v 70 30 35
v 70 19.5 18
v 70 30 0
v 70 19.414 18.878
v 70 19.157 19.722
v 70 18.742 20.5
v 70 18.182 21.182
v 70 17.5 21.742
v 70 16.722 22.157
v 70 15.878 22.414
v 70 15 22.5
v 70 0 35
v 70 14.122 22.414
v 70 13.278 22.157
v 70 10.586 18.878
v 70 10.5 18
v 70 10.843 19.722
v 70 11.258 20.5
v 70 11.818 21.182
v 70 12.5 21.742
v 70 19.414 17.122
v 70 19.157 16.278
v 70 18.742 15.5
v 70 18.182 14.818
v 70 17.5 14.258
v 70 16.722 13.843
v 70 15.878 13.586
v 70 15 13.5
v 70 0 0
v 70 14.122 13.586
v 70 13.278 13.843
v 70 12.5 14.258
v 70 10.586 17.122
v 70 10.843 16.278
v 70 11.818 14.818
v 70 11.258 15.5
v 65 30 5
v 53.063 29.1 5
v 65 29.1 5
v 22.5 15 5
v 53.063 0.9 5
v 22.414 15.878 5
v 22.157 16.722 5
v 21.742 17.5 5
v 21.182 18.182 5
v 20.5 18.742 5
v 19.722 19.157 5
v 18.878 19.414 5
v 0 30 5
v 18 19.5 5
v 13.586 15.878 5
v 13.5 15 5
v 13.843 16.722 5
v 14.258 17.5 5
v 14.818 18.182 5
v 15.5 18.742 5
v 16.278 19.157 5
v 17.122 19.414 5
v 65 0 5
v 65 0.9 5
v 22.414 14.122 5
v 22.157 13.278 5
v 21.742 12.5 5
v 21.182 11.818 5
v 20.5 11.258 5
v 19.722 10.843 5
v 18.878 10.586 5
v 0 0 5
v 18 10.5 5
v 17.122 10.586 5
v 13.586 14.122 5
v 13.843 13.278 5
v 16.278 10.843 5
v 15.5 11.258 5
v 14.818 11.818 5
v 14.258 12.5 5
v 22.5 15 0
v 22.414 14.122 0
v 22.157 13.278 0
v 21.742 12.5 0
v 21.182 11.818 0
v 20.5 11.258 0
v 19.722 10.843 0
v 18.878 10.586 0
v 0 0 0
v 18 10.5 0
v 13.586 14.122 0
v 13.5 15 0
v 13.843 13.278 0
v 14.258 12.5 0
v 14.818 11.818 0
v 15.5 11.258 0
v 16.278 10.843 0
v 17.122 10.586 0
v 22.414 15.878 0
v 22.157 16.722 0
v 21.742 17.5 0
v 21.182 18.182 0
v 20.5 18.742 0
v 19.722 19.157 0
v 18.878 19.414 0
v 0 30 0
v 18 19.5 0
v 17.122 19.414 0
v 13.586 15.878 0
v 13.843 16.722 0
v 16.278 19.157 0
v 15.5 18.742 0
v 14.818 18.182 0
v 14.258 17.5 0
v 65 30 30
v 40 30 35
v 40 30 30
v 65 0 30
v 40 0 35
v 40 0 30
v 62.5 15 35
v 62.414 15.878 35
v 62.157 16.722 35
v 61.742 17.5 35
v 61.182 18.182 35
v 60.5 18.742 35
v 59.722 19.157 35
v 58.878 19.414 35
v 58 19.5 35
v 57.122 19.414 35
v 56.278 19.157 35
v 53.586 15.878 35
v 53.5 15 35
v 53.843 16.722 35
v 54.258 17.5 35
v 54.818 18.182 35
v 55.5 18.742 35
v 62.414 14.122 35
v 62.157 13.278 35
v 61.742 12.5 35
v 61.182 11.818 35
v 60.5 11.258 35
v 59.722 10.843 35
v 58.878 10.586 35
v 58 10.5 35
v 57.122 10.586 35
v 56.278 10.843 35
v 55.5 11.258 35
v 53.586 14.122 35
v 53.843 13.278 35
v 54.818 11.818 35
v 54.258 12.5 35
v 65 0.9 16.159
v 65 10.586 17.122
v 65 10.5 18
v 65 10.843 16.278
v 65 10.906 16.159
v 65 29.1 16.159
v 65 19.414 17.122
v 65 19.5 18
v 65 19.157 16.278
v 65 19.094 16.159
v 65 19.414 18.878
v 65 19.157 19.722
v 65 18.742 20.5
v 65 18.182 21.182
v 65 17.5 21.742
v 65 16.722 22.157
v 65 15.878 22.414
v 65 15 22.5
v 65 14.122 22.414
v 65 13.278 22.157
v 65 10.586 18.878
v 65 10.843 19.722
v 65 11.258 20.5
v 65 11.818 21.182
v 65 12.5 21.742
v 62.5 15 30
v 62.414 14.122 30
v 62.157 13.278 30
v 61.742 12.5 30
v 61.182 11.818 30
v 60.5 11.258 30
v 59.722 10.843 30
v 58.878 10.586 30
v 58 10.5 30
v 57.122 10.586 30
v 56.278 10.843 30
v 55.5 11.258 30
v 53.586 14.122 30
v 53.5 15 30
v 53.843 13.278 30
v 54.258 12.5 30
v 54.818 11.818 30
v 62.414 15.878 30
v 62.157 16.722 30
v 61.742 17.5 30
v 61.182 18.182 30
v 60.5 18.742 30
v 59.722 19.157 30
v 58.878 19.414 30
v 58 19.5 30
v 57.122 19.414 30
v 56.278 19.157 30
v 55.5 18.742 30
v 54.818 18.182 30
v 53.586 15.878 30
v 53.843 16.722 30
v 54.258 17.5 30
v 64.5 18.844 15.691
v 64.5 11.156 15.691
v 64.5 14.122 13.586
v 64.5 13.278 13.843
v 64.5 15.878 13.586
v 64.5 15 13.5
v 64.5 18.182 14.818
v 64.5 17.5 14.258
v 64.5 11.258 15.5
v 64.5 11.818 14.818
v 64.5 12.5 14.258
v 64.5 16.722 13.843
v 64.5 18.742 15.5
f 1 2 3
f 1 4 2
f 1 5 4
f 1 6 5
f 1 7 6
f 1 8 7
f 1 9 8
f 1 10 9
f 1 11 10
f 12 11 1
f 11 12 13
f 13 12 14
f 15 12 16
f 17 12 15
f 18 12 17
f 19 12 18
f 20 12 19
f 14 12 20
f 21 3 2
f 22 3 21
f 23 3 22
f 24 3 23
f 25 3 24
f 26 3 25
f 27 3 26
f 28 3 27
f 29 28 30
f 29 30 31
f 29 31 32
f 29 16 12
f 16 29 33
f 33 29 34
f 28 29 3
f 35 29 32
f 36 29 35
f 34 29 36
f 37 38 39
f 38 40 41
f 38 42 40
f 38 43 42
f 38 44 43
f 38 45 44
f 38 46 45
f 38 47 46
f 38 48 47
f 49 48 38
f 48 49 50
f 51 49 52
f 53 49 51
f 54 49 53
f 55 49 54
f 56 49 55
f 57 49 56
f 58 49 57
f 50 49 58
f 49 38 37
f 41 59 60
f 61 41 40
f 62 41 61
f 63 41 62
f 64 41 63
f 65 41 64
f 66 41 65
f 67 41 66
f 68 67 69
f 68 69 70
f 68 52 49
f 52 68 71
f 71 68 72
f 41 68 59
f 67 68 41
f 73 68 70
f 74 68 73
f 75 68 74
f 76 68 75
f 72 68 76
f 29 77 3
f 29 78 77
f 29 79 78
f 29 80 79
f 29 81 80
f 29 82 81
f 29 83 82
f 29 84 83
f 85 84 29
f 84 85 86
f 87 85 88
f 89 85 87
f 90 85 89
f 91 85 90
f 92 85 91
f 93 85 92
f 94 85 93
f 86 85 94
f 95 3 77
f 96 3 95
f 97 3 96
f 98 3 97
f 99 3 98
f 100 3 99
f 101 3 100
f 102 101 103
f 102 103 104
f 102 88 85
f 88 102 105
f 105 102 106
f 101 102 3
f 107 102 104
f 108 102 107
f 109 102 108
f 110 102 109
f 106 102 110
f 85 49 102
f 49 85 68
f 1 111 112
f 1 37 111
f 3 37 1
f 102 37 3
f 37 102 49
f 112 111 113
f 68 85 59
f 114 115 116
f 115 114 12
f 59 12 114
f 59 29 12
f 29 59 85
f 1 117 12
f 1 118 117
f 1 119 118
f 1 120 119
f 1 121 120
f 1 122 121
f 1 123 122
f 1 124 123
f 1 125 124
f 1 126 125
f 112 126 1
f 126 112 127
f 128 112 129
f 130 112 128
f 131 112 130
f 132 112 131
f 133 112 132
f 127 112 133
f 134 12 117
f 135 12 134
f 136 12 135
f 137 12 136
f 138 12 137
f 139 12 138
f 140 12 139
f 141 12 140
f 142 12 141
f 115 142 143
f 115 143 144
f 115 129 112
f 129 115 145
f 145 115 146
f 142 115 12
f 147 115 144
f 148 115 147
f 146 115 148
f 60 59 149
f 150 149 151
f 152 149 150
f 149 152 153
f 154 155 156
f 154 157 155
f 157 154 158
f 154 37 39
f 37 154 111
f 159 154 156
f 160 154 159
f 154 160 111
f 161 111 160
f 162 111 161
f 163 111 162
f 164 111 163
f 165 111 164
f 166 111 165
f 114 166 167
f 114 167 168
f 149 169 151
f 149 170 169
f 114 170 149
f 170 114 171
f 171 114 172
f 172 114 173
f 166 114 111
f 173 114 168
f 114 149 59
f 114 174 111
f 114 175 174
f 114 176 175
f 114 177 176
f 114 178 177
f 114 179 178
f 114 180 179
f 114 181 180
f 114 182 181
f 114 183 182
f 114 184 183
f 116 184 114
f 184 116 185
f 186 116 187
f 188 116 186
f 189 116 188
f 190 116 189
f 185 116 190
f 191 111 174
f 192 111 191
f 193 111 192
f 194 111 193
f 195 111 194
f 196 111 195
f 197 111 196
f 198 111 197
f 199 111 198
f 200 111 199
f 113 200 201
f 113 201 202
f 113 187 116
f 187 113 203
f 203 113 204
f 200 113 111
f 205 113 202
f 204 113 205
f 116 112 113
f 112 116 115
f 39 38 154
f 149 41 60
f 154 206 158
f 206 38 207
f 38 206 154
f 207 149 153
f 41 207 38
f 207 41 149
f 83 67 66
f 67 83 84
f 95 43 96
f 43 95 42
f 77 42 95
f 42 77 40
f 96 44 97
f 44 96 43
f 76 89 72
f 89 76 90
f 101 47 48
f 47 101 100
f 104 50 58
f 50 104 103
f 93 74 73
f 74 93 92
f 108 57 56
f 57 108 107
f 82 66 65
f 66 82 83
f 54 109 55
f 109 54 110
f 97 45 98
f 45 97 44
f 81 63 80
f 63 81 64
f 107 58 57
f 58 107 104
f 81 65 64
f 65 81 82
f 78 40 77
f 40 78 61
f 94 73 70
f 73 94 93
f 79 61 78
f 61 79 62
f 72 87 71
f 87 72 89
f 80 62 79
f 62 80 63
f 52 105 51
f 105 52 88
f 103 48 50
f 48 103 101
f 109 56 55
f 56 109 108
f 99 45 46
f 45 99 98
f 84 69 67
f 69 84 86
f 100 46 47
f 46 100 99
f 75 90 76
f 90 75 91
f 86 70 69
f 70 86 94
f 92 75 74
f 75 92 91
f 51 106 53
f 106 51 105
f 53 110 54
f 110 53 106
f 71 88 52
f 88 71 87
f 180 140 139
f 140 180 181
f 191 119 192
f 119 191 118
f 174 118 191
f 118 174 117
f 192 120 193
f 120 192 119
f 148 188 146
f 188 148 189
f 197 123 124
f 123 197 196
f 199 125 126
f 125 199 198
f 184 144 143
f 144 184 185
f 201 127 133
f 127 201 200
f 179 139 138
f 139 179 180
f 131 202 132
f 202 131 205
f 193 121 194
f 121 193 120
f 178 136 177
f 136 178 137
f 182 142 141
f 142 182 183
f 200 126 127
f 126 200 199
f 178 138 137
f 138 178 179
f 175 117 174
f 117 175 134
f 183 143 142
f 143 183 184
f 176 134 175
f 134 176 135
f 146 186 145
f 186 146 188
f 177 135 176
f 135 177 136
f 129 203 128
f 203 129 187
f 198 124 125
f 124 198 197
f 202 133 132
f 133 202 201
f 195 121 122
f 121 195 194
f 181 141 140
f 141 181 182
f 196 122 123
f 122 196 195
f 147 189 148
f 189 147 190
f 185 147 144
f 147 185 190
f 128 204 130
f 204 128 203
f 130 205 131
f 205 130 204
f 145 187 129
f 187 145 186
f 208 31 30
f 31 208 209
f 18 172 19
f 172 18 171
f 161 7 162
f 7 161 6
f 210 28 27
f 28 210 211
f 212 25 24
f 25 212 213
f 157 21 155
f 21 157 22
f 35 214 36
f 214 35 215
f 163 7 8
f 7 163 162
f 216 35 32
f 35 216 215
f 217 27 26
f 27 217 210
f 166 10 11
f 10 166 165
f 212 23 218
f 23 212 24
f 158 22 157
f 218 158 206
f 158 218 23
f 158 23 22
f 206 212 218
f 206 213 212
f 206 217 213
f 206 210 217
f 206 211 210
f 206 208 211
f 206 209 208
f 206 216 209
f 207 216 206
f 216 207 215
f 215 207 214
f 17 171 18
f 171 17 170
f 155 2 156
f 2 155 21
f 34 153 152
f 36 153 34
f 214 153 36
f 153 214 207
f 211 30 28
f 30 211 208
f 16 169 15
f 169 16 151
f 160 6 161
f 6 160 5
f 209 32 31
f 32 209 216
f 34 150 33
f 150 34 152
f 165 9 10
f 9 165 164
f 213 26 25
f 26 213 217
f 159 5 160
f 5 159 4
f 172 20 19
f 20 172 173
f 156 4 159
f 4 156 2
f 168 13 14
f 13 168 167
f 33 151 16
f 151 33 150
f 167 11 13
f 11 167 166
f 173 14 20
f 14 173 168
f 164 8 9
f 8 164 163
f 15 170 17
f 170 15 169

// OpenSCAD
$fn = 32;

// ----------------------------------------------------------------------
// Z-bracket: 70 x 30 x 35 mm
// ----------------------------------------------------------------------

// --- parameters (mm) ---
foot_len = 70;            // lower foot length, X
top_len = 25;             // upper foot length, X
depth = 30;               // bracket width, Y
step_h = 35;              // overall rise, Z
plate_t = 5;              // plate thickness
hole_d = 9;               // clearance for M8
rib_len = 12.9;           // gusset leg
rib_sink = 0.9;           // gusset overlap into the plates

module hole_z(px, py, z0) {
  translate([px, py, z0 - 0.5]) cylinder(h = plate_t + 1, d = hole_d);
}
module hole_x(py, pz) {
  translate([-0.5, py, pz]) rotate([0, 90, 0]) cylinder(h = plate_t + 1, d = hole_d);
}
module gusset(x0) {
  translate([x0, depth - rib_sink, 0])
    rotate([90, 0, 0])
      linear_extrude(height = depth - 2 * rib_sink)
        polygon(points = [[rib_sink, plate_t - rib_sink],
                          [rib_sink, plate_t - rib_sink + rib_len],
                          [-rib_len, plate_t - rib_sink]]);
}

difference() {
  union() {
    cube([foot_len, depth, plate_t]);
    /* web, overlapping the lower foot */
    translate([foot_len - plate_t, 0, 0]) cube([plate_t, depth, step_h]);
    /* upper foot, sunk into the web */
    translate([foot_len - plate_t - top_len, 0, step_h - plate_t]) cube([top_len + plate_t, depth, plate_t]);
    gusset(foot_len - plate_t);
  }
  hole_z(18, 15, 0);
  translate([foot_len - plate_t - 7, 0, 0]) hole_z(0, 15, step_h - plate_t);
  translate([foot_len - plate_t, 0, 0]) hole_x(15, 18);
}
